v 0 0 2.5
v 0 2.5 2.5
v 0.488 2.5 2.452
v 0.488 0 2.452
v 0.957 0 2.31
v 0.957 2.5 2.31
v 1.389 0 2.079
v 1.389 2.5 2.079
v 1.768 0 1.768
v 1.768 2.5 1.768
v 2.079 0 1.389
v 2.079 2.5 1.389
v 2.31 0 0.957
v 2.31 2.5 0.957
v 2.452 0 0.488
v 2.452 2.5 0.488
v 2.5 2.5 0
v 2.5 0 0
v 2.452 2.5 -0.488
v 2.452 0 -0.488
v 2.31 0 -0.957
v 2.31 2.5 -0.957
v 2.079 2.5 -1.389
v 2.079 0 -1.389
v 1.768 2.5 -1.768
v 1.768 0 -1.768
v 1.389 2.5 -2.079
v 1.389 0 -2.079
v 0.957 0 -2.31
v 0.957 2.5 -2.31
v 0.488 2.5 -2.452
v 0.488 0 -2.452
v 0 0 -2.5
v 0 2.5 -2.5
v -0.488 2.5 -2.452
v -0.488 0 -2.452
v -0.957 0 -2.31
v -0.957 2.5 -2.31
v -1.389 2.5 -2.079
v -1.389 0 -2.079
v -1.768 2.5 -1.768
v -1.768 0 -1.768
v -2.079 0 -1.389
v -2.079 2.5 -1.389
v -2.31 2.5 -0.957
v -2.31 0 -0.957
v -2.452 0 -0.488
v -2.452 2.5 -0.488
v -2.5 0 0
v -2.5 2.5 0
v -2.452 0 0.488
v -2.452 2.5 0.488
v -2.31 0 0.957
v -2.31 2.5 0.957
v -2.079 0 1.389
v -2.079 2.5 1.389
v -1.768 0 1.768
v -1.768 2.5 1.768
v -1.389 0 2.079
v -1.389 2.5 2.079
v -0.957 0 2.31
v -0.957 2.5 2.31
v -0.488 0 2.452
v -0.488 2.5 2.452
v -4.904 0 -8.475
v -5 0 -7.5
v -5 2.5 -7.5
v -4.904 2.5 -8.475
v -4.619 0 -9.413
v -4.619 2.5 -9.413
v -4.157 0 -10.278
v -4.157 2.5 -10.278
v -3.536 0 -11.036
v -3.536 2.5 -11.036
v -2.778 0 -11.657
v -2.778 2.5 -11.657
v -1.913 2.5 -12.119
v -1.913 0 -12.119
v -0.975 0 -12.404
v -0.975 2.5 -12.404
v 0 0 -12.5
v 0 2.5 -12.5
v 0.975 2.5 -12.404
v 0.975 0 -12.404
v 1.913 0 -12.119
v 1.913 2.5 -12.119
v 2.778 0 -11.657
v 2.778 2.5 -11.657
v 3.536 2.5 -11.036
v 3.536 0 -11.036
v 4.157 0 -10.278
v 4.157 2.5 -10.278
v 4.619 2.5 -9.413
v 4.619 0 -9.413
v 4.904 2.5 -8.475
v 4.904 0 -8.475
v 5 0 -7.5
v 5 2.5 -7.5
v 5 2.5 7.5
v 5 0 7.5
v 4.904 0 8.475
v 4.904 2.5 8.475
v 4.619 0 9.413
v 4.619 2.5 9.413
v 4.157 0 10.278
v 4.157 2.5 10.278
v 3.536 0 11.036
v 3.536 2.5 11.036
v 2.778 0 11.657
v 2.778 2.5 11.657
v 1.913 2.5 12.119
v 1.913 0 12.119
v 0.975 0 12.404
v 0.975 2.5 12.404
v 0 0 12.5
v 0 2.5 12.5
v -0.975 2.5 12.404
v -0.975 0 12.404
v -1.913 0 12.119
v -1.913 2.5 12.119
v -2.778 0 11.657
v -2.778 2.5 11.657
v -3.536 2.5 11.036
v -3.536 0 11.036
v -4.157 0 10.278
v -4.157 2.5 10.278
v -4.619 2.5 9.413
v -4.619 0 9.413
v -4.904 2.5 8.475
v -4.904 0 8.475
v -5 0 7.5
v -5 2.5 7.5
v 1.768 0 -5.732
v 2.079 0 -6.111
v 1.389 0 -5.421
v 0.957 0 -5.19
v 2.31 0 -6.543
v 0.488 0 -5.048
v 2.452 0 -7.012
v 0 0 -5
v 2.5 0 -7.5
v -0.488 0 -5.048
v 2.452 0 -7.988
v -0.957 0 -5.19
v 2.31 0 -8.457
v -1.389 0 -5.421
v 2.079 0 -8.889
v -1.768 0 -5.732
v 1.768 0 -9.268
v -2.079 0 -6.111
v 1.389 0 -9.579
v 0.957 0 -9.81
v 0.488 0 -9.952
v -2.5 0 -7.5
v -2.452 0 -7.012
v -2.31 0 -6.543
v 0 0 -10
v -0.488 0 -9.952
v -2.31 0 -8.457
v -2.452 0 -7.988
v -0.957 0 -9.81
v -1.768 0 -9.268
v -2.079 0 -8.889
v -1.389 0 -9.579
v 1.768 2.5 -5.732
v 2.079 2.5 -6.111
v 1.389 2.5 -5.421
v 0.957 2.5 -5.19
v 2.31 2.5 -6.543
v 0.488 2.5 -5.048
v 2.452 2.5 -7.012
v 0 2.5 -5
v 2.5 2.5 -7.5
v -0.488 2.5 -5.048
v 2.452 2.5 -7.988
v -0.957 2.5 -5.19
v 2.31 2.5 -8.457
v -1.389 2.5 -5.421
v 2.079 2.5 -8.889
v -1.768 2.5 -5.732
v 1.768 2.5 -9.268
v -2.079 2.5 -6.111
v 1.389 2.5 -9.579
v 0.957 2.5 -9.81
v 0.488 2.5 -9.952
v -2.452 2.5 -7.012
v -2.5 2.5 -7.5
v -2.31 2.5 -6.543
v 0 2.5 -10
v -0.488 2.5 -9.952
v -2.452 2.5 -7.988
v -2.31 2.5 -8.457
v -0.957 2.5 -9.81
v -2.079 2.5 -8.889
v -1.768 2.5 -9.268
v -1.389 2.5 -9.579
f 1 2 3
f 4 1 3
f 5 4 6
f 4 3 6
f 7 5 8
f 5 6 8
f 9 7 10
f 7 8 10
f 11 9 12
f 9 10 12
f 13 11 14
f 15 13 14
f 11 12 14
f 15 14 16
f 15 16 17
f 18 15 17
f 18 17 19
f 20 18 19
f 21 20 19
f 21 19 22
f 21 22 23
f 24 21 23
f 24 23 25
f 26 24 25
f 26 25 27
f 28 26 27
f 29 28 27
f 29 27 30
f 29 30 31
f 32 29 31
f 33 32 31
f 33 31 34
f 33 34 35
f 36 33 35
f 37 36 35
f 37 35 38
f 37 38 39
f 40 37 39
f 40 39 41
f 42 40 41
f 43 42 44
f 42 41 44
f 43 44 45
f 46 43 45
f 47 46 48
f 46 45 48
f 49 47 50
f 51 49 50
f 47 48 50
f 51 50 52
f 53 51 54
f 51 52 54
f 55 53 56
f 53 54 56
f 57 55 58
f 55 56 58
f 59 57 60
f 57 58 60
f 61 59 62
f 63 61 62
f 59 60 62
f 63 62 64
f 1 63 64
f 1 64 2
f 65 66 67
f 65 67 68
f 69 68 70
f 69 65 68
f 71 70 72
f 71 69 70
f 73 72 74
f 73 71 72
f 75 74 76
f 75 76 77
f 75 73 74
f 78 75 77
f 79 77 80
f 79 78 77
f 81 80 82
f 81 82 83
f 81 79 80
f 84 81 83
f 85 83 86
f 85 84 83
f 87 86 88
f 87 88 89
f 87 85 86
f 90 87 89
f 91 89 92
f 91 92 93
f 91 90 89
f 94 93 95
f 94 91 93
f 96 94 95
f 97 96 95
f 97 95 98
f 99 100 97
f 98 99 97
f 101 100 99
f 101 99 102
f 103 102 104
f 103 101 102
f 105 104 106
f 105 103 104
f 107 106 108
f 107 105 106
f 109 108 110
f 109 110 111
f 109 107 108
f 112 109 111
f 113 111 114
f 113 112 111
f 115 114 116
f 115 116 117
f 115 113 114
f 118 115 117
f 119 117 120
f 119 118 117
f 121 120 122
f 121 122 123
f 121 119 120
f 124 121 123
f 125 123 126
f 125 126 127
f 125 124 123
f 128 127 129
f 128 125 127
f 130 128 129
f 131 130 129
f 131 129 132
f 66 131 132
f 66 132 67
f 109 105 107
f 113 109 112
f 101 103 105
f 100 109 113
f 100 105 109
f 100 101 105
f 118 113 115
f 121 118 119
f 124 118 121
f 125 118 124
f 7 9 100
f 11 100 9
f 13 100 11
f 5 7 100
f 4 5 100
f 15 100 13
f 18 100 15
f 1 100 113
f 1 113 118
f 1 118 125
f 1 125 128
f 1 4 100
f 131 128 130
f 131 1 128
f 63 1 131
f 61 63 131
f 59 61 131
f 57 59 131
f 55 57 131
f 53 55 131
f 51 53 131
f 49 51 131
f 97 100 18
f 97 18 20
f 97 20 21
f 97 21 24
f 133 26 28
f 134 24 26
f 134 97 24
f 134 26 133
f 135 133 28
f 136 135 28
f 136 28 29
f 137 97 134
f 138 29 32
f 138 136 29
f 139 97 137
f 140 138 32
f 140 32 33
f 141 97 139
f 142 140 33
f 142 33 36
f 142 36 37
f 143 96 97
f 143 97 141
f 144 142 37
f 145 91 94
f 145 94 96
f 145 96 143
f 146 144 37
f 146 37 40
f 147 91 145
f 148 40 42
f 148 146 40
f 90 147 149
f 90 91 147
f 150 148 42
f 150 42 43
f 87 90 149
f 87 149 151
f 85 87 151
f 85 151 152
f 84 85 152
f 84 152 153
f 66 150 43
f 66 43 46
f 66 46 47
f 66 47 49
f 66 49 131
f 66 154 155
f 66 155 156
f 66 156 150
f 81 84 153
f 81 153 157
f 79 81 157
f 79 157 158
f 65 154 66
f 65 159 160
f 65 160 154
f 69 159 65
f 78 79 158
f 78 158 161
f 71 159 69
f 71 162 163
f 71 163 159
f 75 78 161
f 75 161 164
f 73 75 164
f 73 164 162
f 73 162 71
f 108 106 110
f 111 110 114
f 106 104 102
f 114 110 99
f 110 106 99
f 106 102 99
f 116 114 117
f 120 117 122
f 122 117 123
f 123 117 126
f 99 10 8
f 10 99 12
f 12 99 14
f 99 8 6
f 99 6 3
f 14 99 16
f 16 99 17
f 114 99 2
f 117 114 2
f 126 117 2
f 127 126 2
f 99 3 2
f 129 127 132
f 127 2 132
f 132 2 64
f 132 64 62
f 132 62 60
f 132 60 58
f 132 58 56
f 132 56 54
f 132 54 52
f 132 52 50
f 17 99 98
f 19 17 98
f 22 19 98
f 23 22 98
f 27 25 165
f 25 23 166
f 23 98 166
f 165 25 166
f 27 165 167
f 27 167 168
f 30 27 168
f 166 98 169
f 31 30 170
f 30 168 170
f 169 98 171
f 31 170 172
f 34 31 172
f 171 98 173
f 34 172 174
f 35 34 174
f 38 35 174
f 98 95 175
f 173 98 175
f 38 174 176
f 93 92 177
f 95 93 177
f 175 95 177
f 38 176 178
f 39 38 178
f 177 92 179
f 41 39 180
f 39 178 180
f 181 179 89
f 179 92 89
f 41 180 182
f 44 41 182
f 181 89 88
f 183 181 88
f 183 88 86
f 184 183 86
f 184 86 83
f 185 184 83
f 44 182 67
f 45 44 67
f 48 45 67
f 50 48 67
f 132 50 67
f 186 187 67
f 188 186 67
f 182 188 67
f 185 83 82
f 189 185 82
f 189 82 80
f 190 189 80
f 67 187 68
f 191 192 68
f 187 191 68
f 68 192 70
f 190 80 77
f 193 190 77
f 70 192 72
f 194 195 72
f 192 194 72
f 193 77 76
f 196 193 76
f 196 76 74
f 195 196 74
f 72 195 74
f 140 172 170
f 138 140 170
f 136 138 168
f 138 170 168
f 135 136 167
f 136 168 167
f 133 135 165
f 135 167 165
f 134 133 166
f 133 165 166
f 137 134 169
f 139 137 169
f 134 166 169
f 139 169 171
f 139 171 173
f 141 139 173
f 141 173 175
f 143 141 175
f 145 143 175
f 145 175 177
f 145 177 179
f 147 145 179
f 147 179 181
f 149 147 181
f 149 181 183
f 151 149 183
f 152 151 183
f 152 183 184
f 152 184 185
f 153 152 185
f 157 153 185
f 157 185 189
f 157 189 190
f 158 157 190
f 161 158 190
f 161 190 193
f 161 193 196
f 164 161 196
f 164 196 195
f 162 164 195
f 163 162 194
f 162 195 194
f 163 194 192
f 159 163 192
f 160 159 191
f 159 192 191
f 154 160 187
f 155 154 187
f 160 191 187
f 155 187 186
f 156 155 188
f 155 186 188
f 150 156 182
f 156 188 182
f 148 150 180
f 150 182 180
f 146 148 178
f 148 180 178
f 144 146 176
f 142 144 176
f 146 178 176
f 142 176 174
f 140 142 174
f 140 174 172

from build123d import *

# Parameters (mm, degrees)
SKETCH1_W           = 10
SKETCH1_H           = 15
BOSS_EXTRUDE1_DEPTH = 2.5
CUT_EXTRUDE1_REACH  = 15.693
SKETCH2_R           = 2.5


with BuildPart() as part:
    # Sketch1 → Boss-Extrude1 (new body)
    with BuildSketch(Plane(origin=(0, 0, 0), x_dir=(1, 0, 0), z_dir=(0, 1, 0))):
        with BuildLine():
            ThreePointArc((-5, 7.5), (0, 12.5), (5, 7.5))
            Line((5, 7.5), (-5, 7.5))
        make_face()
        Rectangle(SKETCH1_W, SKETCH1_H)
        with BuildLine():
            Line((-5, -7.5), (5, -7.5))
            ThreePointArc((5, -7.5), (0, -12.5), (-5, -7.5))
        make_face()
    extrude(amount=BOSS_EXTRUDE1_DEPTH)

    # Sketch2 → Cut-Extrude1 (cut, up to next)
    with BuildSketch(Plane(origin=(0, 2.5, 0), x_dir=(1, 0, 0), z_dir=(0, 1, 0)), mode=Mode.PRIVATE) as cut_extrude1_sk1:
        with Locations(Location((0, 7.5, 0), (0, 0, 270))):
            Circle(SKETCH2_R)
    cut_extrude1_tool1 = extrude(cut_extrude1_sk1.sketch, amount=-CUT_EXTRUDE1_REACH, mode=Mode.PRIVATE) & part.part
    # Sketch2 → Cut-Extrude1 (cut, up to next)
    with BuildSketch(Plane(origin=(0, 2.5, 0), x_dir=(1, 0, 0), z_dir=(0, 1, 0)), mode=Mode.PRIVATE) as cut_extrude1_sk2:
        with Locations(Location((0, 0, 0), (0, 0, 270))):
            Circle(SKETCH2_R)
    cut_extrude1_tool2 = extrude(cut_extrude1_sk2.sketch, amount=-CUT_EXTRUDE1_REACH, mode=Mode.PRIVATE) & part.part
    add(cut_extrude1_tool1.solids().sort_by_distance((0, 2.5, -7.5))[0], mode=Mode.SUBTRACT)
    add(cut_extrude1_tool2.solids().sort_by_distance((0, 2.5, 0))[0], mode=Mode.SUBTRACT)


solid = part.part
